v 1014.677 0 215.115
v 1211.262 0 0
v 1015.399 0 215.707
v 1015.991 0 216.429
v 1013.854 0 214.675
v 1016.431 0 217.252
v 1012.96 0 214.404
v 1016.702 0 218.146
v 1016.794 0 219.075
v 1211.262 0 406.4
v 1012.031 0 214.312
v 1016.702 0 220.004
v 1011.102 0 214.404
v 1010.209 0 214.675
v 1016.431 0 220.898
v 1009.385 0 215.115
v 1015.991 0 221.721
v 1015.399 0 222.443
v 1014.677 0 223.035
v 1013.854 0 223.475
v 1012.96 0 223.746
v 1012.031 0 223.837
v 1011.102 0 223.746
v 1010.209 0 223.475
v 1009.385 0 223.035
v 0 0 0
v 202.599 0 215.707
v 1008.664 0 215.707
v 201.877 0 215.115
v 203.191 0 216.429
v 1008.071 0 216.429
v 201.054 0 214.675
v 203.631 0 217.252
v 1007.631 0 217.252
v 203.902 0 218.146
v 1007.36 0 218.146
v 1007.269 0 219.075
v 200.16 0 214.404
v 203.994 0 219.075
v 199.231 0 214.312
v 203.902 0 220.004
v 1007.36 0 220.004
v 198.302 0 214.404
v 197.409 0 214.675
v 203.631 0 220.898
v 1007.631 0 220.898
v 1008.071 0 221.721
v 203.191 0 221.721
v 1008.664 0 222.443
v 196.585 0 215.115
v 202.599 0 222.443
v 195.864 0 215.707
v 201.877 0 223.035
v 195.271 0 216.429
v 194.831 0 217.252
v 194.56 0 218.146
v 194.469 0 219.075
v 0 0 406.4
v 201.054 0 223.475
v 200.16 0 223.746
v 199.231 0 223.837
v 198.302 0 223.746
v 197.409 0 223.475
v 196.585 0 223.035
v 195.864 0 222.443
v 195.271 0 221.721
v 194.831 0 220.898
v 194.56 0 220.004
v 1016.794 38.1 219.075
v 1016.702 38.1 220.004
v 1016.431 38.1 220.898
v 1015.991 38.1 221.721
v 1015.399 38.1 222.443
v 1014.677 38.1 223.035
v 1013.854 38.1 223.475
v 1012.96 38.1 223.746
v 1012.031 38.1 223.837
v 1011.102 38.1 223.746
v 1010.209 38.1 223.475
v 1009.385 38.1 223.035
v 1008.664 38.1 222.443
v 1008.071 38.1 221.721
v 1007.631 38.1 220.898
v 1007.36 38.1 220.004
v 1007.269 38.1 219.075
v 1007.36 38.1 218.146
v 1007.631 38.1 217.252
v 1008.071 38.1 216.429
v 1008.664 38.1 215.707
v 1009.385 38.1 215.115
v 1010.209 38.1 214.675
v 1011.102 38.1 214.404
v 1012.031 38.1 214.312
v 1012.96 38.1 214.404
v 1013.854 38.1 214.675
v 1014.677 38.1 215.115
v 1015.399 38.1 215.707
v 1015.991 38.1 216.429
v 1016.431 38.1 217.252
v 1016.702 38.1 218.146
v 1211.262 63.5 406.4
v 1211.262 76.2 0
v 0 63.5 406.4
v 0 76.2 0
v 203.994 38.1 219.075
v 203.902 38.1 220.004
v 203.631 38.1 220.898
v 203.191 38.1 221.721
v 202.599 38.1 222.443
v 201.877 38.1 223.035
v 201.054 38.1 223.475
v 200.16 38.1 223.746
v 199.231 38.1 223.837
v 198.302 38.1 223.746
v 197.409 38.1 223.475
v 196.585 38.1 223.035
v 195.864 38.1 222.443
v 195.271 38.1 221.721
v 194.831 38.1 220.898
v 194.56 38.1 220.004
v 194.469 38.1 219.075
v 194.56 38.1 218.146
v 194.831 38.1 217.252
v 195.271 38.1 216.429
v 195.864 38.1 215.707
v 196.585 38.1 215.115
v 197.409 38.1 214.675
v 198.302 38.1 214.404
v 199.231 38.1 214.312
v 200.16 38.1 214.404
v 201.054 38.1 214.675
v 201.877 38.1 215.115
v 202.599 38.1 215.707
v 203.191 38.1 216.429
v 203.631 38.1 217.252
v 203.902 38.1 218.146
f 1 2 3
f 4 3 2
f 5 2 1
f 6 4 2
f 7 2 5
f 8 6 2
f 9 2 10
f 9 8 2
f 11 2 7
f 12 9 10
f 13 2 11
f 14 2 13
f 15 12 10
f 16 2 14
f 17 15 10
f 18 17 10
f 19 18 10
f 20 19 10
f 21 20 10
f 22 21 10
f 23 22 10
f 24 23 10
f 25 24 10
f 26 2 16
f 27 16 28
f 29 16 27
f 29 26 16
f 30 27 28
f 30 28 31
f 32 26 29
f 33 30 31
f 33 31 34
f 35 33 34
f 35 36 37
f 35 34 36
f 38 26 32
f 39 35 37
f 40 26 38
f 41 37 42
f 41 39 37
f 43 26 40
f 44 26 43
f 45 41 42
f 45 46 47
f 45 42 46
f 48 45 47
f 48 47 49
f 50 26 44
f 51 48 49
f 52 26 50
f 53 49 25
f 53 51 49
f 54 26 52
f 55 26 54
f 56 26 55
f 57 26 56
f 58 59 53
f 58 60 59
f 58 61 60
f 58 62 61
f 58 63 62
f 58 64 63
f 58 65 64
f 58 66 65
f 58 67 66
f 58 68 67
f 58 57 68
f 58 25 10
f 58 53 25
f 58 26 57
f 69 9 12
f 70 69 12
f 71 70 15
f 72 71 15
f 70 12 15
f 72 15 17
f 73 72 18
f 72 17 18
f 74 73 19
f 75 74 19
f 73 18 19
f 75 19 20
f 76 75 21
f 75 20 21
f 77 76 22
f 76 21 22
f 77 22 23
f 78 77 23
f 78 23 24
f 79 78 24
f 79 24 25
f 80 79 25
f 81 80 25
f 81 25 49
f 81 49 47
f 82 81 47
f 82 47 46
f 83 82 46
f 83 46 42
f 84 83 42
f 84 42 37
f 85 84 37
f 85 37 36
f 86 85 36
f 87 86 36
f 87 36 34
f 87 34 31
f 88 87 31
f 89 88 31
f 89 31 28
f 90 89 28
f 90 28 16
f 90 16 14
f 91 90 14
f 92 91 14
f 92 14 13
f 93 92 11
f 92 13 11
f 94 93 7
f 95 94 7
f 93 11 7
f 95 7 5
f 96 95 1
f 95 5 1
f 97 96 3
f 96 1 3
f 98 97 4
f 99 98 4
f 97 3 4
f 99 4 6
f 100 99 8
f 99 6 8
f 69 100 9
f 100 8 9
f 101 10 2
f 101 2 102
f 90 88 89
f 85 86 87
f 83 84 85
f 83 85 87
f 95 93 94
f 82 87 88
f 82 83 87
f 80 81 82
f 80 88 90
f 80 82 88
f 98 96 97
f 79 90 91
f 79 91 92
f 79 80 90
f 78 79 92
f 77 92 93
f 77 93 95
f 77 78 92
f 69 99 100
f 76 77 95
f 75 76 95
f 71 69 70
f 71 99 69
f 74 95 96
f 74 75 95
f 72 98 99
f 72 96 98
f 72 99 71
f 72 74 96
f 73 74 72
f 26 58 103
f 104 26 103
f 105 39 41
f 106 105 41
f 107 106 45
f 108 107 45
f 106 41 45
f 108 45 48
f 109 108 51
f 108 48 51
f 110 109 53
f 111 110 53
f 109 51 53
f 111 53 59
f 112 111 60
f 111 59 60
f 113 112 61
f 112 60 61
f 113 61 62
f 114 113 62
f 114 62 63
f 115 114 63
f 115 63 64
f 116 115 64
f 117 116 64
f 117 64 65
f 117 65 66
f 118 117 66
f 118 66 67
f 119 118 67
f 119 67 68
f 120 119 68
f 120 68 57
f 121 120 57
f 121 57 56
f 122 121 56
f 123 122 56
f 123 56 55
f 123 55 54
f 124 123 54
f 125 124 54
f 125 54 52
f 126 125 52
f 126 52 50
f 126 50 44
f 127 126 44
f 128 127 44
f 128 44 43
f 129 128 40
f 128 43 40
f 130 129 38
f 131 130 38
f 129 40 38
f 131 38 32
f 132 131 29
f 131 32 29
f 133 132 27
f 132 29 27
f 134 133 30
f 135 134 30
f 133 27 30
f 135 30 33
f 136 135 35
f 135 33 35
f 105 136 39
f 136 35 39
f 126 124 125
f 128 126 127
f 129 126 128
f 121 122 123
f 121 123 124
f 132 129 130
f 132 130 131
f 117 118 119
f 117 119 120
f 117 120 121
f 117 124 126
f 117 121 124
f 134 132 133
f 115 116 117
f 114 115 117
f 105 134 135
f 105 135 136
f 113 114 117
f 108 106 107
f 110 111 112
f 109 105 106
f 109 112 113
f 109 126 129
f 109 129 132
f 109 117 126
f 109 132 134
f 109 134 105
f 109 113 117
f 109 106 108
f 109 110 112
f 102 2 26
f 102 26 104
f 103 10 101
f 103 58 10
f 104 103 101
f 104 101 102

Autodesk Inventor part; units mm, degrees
ref_plane "YZ Plane" through (0, 0, 0) normal (1, 0, 0) x (0, 1, 0)
ref_plane "XZ Plane" through (0, 0, 0) normal (0, 1, 0) x (-1, 0, 0)
ref_plane "XY Plane" through (0, 0, 0) normal (0, 0, 1) x (1, 0, 0)
sketch "Sketch1" plane through (0, 0, 0) normal (1, 0, 0) x (0, 1, 0)
  line L0 (0, 0) -> (76.2, 0)
  line L1 (0, 0) -> (0, 406.4)
  line L2 (0, 406.4) -> (63.5, 406.4)
  line L3 (63.5, 406.4) -> (76.2, 0)
  dimension "d0" = 76.2
  dimension "d1" = 406.4
  dimension "d2" = 63.5
extrude "Extrusion1" add sketch "Sketch1" along normal blind 1211.2625
sketch "Sketch2" plane through (0, 0, 0) normal (0, -1, 0) x (1, 0, 0)
  line L0 (0, 406.4) -> (1211.2625, 406.4) projected
  line L1 (1211.2625, 406.4) -> (1211.2625, 0) projected
  line L2 (0, 406.4) -> (0, 0) projected
  line L3 (1211.2625, 0) -> (1211.2625, 406.4) construction
  line L4 (1211.2625, 219.075) -> (0, 219.075) construction
  line L5 (0, 406.4) -> (1211.2625, 406.4) construction
  line L6 (1012.0312, 406.4) -> (1012.0312, 0) construction
  line L7 (0, 0) -> (1211.2625, 0) construction
  line L8 (199.2312, 406.4) -> (199.2312, 0) construction
  line L9 (605.6313, 0) -> (605.6313, 406.4) construction
  circle A0 centre (1012.0312, 219.075) radius 4.7625
  circle A1 centre (199.2312, 219.075) radius 4.7625
  dimension "d5" = 187.325
  dimension "d6" = 812.8
  dimension "d7" = 9.525
  dimension "d8" = 9.525
extrude "Extrusion2" cut sketch "Sketch2" against normal blind 38.1
equation "\"d8\" = d7"
properties part number "Coping - 4" material "Granite, Cut, Polished"
